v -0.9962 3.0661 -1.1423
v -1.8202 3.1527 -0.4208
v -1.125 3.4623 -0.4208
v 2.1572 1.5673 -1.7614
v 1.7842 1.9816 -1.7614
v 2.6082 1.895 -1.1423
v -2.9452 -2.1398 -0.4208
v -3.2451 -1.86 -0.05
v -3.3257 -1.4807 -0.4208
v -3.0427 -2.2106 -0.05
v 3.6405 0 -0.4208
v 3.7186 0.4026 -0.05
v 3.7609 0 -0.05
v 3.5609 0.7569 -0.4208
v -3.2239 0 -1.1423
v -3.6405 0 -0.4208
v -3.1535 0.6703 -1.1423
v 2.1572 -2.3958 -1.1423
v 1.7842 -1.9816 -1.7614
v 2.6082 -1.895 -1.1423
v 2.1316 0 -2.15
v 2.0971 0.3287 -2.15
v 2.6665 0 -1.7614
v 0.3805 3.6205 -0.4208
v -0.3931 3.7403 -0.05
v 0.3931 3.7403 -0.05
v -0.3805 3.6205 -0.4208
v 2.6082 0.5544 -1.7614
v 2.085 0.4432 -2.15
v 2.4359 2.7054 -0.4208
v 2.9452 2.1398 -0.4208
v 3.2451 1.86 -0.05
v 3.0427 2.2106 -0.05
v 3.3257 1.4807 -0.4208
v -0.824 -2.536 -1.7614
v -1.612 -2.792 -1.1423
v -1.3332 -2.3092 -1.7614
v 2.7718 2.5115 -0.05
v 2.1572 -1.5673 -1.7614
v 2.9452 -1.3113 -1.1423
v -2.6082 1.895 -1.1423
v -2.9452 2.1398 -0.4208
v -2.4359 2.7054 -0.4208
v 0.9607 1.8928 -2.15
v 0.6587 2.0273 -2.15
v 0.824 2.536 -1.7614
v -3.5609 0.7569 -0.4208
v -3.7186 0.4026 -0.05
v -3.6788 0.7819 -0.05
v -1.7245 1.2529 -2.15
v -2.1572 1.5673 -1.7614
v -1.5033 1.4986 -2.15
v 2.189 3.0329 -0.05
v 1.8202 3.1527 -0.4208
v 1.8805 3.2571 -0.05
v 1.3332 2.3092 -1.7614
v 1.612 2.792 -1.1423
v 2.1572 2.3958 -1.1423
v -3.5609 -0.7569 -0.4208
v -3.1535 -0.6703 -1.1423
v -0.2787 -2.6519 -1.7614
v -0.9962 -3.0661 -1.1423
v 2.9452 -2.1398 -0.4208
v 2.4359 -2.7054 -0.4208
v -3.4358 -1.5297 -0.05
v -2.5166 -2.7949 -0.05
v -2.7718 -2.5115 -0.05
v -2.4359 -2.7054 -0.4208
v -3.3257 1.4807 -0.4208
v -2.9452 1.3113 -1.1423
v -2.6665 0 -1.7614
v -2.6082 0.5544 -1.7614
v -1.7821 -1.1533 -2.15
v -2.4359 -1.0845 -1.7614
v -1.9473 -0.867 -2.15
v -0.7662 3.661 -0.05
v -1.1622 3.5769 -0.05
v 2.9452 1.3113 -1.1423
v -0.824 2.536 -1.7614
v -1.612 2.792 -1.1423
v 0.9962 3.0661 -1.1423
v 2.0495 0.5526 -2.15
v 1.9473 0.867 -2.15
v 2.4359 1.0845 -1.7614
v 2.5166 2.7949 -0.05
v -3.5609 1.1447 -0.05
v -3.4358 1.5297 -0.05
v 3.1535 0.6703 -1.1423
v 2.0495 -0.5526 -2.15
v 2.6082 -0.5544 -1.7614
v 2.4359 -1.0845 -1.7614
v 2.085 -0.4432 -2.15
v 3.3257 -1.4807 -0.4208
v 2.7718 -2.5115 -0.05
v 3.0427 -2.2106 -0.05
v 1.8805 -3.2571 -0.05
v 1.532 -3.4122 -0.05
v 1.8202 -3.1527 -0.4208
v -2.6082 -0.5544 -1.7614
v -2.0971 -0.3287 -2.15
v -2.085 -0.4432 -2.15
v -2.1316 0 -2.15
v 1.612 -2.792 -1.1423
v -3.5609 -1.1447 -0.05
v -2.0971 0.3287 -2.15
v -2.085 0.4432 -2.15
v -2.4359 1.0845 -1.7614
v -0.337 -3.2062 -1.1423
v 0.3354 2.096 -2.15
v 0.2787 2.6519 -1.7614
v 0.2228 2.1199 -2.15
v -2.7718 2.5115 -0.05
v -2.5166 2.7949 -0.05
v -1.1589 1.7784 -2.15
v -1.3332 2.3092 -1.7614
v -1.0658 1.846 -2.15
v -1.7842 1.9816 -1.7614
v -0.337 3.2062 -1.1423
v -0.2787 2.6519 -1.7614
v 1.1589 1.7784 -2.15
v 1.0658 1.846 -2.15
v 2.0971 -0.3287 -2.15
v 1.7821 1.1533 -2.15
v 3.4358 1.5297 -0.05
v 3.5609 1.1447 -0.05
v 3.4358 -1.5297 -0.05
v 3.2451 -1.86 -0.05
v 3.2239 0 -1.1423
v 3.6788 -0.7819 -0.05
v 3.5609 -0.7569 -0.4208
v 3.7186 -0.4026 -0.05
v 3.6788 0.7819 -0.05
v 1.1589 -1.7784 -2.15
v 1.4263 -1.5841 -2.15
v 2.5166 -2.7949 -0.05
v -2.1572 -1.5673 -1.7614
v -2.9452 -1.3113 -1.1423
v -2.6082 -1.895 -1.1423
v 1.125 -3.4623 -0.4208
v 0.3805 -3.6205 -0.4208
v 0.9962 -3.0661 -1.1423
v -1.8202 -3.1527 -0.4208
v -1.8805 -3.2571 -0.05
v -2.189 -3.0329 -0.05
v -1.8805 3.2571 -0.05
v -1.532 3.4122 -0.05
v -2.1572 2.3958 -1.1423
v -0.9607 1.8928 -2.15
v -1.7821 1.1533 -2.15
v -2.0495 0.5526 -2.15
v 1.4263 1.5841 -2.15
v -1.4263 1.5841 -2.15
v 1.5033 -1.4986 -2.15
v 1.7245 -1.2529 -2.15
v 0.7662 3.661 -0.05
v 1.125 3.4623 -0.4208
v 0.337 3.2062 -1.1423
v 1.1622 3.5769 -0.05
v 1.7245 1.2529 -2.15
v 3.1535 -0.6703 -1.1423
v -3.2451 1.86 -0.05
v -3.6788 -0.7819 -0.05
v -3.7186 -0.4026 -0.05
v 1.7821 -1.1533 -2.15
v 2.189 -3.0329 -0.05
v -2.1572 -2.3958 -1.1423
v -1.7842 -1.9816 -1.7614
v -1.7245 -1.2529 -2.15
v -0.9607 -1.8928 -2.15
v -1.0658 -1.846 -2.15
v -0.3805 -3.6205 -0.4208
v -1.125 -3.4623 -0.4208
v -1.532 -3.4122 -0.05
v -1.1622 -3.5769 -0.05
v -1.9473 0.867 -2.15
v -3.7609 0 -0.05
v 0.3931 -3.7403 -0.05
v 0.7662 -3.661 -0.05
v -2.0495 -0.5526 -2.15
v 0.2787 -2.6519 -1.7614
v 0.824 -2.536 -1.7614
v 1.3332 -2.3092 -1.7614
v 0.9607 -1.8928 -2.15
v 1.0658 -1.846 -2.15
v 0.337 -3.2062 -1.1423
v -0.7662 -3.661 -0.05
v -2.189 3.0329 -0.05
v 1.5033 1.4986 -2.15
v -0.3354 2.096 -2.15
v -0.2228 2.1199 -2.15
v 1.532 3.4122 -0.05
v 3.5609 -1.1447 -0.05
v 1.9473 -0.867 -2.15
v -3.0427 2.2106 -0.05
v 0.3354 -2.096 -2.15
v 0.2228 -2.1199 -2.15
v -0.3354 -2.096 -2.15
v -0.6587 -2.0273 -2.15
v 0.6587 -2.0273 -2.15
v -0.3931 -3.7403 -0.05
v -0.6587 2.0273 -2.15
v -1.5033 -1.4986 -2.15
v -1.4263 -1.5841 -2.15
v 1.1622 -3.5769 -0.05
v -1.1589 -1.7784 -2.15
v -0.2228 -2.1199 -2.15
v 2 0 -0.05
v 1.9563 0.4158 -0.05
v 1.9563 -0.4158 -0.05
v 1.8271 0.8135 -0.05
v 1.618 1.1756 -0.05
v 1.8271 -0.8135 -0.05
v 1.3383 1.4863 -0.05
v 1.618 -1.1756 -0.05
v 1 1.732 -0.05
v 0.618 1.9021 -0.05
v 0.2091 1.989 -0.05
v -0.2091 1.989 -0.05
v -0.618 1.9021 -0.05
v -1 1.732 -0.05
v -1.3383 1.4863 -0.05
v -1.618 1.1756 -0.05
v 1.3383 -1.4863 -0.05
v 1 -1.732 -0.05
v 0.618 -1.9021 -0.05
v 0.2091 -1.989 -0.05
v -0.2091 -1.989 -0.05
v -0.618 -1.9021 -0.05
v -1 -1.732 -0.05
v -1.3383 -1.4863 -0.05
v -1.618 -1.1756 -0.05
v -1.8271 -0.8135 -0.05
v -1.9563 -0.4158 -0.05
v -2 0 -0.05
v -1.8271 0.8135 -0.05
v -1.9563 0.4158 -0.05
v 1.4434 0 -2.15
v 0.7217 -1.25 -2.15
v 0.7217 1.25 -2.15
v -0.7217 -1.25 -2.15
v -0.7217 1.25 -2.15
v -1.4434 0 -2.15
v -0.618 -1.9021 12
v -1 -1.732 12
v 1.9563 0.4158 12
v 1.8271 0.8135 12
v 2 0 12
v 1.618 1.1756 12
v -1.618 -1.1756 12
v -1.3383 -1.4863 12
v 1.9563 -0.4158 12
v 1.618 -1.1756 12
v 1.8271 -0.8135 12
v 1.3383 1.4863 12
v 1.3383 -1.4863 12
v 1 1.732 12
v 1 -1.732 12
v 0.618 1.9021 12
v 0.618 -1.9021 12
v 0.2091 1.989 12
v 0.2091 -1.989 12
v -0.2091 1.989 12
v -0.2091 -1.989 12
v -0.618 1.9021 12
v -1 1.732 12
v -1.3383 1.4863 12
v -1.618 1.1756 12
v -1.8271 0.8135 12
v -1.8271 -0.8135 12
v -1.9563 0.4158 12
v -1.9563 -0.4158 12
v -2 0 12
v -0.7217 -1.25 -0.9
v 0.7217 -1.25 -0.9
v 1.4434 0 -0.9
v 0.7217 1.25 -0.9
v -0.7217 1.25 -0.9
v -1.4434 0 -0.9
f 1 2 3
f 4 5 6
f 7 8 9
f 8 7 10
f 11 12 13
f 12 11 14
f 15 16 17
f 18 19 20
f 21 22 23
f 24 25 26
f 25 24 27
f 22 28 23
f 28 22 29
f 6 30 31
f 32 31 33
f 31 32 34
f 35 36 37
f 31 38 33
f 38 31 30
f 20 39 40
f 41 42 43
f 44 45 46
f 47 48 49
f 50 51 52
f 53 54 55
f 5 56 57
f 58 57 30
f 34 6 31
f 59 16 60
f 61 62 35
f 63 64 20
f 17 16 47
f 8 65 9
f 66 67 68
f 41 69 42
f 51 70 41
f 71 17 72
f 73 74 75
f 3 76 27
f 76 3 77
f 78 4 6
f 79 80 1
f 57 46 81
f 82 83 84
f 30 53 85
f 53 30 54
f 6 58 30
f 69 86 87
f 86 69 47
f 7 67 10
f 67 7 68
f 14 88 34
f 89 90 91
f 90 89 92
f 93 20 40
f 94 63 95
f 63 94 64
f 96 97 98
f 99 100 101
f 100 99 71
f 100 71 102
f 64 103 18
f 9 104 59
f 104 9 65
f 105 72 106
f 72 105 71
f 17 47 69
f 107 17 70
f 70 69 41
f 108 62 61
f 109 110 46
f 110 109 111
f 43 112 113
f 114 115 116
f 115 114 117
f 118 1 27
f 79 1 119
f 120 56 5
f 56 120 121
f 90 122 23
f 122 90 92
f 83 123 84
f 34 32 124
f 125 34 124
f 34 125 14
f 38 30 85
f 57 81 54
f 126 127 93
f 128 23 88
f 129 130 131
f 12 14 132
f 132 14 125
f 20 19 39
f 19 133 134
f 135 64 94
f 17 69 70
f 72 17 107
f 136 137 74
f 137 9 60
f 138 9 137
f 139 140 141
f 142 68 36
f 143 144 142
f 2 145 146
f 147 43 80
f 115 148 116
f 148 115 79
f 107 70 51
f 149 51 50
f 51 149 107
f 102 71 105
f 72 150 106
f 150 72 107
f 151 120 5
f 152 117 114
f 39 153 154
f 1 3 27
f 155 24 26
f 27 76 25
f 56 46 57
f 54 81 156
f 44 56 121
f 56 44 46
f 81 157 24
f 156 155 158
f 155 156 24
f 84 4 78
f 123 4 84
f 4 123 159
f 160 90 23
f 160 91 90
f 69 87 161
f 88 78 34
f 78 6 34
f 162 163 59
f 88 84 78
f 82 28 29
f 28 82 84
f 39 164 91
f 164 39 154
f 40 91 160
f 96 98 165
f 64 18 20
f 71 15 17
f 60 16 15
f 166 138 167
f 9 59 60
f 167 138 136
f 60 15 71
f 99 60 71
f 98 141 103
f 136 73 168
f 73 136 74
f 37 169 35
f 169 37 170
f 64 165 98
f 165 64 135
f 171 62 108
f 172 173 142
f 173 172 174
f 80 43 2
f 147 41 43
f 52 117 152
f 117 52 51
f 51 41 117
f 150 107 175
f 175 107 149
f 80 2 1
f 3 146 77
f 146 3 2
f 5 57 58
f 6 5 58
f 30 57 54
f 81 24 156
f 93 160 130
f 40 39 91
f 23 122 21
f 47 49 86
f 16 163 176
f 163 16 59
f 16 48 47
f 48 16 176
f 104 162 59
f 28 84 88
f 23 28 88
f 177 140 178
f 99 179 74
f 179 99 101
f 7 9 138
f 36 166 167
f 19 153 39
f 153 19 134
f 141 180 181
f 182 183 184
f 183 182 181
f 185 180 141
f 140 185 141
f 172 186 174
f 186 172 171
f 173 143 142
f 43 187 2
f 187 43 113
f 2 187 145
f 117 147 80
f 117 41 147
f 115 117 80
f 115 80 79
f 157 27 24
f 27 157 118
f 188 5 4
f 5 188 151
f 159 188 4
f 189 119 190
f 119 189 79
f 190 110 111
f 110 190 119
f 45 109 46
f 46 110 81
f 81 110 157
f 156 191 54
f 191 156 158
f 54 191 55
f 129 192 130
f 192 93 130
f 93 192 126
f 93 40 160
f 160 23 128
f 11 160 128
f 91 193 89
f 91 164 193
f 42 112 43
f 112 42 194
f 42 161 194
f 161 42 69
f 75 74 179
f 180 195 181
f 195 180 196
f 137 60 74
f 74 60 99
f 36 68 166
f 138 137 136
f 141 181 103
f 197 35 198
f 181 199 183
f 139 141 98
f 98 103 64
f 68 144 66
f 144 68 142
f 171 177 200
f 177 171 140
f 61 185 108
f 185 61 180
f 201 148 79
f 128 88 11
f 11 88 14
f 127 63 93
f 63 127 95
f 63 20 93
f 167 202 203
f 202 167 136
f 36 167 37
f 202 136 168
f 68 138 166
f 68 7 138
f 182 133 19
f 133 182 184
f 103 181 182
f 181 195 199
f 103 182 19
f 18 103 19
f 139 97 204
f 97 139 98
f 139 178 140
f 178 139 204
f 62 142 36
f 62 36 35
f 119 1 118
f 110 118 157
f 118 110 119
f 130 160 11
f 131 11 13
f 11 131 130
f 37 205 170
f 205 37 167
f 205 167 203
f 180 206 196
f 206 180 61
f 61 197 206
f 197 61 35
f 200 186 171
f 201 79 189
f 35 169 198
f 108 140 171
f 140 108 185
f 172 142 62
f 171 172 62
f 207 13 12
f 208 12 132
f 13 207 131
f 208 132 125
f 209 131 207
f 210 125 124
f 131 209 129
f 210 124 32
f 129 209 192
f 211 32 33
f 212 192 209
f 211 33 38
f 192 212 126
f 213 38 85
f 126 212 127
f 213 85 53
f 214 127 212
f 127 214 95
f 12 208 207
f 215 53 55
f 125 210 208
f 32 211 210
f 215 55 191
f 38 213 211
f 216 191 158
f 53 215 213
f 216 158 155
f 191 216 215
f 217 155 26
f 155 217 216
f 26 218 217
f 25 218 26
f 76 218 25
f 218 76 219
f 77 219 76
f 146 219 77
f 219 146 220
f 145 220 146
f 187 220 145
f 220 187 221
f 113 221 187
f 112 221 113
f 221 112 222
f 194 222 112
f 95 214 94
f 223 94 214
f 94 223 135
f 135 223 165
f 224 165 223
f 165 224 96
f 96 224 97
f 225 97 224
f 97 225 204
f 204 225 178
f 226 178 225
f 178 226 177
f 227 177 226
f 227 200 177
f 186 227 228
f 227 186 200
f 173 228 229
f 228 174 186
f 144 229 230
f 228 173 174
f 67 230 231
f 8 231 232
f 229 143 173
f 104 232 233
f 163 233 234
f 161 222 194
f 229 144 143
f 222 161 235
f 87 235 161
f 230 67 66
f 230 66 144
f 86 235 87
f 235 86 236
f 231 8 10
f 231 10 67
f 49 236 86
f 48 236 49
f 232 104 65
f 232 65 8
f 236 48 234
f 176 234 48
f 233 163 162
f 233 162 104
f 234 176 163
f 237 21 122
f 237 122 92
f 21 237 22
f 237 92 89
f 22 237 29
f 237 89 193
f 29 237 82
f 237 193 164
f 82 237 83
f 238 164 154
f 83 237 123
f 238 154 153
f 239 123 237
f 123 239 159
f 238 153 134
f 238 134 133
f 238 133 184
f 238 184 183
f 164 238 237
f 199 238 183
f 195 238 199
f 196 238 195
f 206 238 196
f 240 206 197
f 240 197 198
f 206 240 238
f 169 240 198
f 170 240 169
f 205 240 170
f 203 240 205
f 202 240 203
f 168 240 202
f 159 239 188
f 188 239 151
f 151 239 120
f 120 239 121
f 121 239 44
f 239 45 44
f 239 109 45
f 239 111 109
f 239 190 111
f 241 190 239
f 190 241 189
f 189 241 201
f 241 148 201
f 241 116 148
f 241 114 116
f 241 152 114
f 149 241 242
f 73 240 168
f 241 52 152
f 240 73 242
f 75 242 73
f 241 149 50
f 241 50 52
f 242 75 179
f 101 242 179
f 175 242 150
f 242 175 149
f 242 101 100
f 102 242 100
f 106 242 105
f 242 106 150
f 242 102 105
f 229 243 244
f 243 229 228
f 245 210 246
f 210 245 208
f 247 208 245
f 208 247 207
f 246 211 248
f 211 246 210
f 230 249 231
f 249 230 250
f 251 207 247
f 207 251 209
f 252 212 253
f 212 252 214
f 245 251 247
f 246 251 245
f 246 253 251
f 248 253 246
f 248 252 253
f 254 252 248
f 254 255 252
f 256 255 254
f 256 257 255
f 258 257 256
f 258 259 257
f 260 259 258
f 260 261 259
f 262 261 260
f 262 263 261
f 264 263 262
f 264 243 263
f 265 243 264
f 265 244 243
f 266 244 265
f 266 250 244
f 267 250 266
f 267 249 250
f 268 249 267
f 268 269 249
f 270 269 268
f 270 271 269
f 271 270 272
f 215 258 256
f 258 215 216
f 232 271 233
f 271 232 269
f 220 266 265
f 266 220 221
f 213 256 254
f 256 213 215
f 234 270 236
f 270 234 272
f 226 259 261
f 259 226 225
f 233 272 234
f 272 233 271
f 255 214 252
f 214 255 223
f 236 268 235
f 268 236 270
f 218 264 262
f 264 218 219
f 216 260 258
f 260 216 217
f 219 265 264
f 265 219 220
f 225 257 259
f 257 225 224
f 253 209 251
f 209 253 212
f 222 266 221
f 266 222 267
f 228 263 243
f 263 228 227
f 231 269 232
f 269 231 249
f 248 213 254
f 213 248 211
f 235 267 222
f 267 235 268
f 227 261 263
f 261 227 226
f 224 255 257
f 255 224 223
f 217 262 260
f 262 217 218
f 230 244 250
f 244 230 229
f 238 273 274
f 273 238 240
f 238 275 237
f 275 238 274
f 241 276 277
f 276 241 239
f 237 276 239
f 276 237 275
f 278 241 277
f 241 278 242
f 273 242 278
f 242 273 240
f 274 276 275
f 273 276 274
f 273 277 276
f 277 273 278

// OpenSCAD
/*
   Copyright 2018 Scott Bezek and the splitflap contributors

   Licensed under the Apache License, Version 2.0 (the "License");
   you may not use this file except in compliance with the License.
   You may obtain a copy of the License at

       http://www.apache.org/licenses/LICENSE-2.0

   Unless required by applicable law or agreed to in writing, software
   distributed under the License is distributed on an "AS IS" BASIS,
   WITHOUT WARRANTIES OR CONDITIONS OF ANY KIND, either express or implied.
   See the License for the specific language governing permissions and
   limitations under the License.
*/

module roughM4_7380(length) {
    eps = 0.1;
    thread_diameter = 4;
    head_diameter = 7.6;
    head_length = 2.2;
    driving_depth = 1.3;
    driving_apothem = 2.5/2;
    driving_radius = driving_apothem / cos(180/6);

    sphere_offset = 1.2;  // Just a guess
    sphere_radius = sqrt(sphere_offset*sphere_offset + (head_diameter/2)*(head_diameter/2));


    difference() {
        union() {
            translate([0, 0, -eps]) {
                cylinder(h=length+eps, d=thread_diameter, $fn=30);
            }
            difference() {
                translate([0, 0, sphere_offset]) {
                    sphere(sphere_radius, $fn=30);
                }
                translate([0, 0, sphere_radius]) {
                    cube([sphere_radius*2 + eps, sphere_radius*2 + eps, sphere_radius*2 + eps], center=true);
                }
                translate([0, 0, -sphere_radius - head_length]) {
                    cube([sphere_radius*2 + eps, sphere_radius*2 + eps, sphere_radius*2 + eps], center=true);
                }
            }
        }
        translate([0, 0, -head_length-eps]) {
            cylinder(h=driving_depth+eps, r=driving_radius, $fn=6);
        }
    }
}

roughM4_7380(12);

        module color_selector(c) {
            precision = 0.0000001;  // arbitrary
            function compare_floats(x, y, i=0) = 
                  (len(x) != len(y)) ? false  // if arrays differ in length, they can't be equal
                : (i >= len(x)) ? true  // if we've hit the end of the arrays without issue, we're equal
                : (x[i] - precision <= y[i]) && x[i] + precision >= y[i]
                    ? compare_floats(x, y, i+1)
                    : false;  // not equal, short circuit

            if (c == [0.88236, 0.6942, 0.48594] || compare_floats(c, [0.88236, 0.6942, 0.48594]))
                children();
        }
                    
